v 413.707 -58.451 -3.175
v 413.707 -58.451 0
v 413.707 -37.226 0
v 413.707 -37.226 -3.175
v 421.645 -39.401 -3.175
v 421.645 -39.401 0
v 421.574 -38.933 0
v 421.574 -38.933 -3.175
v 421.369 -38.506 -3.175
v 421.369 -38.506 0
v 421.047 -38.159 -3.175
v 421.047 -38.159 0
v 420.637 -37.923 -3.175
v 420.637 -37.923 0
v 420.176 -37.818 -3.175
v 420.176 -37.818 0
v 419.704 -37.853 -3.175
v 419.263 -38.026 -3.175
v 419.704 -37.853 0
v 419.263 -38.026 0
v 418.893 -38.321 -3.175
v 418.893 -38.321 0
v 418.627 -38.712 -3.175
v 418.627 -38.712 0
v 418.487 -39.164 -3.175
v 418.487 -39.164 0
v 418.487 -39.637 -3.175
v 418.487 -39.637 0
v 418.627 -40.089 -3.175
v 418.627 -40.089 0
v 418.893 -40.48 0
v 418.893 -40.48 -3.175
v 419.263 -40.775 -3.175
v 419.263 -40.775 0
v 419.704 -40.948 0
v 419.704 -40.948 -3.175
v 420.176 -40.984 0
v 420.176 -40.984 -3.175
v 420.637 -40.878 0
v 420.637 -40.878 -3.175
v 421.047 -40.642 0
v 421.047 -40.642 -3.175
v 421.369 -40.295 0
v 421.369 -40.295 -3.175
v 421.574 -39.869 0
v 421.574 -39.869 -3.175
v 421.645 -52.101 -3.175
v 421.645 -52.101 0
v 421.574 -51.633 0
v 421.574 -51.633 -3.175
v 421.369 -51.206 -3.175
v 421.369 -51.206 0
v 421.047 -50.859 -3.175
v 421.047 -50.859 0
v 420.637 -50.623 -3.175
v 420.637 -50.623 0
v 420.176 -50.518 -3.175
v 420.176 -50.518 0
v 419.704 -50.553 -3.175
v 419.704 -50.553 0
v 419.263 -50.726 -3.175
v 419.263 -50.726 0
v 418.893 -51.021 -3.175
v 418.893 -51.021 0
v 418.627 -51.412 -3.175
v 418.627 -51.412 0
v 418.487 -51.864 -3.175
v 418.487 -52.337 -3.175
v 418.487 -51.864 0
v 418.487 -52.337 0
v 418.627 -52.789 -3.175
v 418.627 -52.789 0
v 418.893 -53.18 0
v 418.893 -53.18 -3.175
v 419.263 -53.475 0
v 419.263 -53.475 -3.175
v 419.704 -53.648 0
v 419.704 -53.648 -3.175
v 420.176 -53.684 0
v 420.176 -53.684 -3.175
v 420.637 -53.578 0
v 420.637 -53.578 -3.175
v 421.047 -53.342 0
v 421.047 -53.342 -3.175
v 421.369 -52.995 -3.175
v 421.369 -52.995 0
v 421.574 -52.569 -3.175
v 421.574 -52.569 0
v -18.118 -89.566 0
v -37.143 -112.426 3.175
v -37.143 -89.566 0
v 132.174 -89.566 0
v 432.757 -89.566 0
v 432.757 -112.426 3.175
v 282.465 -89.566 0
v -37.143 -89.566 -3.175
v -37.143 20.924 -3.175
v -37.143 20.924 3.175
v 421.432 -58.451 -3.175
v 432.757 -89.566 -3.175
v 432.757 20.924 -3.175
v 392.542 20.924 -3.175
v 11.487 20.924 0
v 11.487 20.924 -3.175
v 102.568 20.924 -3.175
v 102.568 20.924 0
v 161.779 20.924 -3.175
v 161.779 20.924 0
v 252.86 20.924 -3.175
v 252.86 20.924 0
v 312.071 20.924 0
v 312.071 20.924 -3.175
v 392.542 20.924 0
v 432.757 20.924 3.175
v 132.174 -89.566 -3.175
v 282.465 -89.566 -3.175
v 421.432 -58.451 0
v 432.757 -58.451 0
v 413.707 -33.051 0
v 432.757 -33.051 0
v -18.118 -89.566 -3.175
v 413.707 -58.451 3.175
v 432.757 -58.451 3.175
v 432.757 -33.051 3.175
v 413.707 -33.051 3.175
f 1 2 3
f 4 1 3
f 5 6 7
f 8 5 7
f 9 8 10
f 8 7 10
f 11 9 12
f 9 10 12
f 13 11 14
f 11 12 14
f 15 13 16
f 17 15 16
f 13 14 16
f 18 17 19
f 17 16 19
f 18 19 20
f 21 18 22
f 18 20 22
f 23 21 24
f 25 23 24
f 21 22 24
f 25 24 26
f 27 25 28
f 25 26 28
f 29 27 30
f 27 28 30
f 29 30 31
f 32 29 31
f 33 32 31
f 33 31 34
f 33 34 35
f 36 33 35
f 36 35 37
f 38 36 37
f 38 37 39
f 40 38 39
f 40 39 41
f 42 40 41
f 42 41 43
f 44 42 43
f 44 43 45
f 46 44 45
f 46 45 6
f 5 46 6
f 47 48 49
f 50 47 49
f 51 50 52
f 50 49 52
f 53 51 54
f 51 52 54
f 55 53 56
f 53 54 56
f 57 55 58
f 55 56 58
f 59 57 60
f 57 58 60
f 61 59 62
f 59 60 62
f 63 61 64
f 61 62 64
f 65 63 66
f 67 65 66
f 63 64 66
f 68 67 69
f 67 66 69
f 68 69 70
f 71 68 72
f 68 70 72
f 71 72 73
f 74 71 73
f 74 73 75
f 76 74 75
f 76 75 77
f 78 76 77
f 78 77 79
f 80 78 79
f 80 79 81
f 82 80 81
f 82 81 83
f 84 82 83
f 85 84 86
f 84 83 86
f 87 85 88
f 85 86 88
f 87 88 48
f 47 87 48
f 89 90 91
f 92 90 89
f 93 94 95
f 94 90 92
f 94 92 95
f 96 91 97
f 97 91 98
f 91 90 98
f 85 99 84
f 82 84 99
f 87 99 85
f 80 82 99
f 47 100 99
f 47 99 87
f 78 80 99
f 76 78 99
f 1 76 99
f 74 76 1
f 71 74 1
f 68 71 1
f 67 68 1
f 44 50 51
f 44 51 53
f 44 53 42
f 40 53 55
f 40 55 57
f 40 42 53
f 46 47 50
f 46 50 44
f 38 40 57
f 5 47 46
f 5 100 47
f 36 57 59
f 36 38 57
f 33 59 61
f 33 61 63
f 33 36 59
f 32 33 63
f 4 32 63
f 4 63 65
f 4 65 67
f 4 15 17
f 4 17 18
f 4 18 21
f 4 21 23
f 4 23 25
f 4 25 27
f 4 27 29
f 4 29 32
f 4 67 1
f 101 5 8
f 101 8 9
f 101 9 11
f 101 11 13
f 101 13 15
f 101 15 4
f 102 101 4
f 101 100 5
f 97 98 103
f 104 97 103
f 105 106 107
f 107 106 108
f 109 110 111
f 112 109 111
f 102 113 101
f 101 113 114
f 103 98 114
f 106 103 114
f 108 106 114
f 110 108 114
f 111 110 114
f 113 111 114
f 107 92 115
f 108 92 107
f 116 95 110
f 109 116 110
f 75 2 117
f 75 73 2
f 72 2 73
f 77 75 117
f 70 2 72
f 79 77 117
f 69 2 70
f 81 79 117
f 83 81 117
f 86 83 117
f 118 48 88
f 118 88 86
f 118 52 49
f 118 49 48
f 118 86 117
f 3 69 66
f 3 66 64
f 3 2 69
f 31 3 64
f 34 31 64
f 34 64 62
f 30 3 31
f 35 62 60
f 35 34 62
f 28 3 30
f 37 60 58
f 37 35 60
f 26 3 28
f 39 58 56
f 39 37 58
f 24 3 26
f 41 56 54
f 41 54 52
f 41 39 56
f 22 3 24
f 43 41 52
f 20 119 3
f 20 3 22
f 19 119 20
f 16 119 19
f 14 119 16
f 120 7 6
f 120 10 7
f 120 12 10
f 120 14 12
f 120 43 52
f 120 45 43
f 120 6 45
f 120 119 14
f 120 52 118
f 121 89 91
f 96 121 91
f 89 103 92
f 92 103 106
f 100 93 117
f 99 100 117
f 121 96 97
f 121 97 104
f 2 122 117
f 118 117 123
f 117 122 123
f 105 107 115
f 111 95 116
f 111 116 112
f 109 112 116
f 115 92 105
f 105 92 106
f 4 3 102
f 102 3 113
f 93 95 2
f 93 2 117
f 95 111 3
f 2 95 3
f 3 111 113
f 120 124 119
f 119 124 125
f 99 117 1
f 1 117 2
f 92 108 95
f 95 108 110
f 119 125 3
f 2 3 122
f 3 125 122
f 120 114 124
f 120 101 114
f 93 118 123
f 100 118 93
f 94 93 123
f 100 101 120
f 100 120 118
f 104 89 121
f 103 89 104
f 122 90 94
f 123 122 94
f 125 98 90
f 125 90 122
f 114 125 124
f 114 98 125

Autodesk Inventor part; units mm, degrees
ref_plane "YZ Plane" through (0, 0, 0) normal (1, 0, 0) x (0, 1, 0)
ref_plane "XZ Plane" through (0, 0, 0) normal (0, 1, 0) x (-1, 0, 0)
ref_plane "XY Plane" through (0, 0, 0) normal (0, 0, 1) x (1, 0, 0)
sketch "Sketch1" plane through (0, 0, 0) normal (0, 0, 1) x (1, 0, 0)
  line L0 (-37.1429, 20.9244) -> (432.7571, 20.9244)
  line L1 (432.7571, 20.9244) -> (432.7571, -112.4256)
  line L2 (432.7571, -112.4256) -> (-37.1429, -112.4256)
  line L3 (-37.1429, -112.4256) -> (-37.1429, 20.9244)
  point P0 (0, 0)
  dimension "d0" = 469.9
  dimension "d1" = 133.35
extrude "Extrusion1" add sketch "Sketch1" along normal blind 3.175
sketch "Sketch2" plane through (432.7571, -112.4256, 0) normal (1, 0, 0) x (0, 0, -1)
  line L0 (0, 133.35) -> (0, 0) projected
  line L1 (-3.175, 133.35) -> (0, 107.95)
  line L2 (-3.175, 0) -> (0, 22.86)
  line L3 (-3.175, 0) -> (0, 0)
  line L4 (0, 22.86) -> (0, 0)
  point P0 (0, 112.4256)
  dimension "d4" = 25.4
  dimension "d5" = 22.86
extrude "Extrusion3" cut sketch "Sketch2" against normal blind 476.25
sketch "Sketch4" plane through (0, 0, 0) normal (0, 0, -1) x (-1, 0, 0)
  line L0 (-432.7571, -89.5656) -> (37.1429, -89.5656) projected
  line L1 (37.1429, 20.9244) -> (-432.7571, 20.9244) projected
  line L2 (-432.7571, 20.9244) -> (-432.7571, -89.5656) projected
  line L3 (-432.7571, -89.5656) -> (37.1429, -89.5656)
  line L4 (37.1429, -89.5656) -> (37.1429, 20.9244)
  line L5 (37.1429, 20.9244) -> (-432.7571, 20.9244)
  line L6 (-432.7571, 20.9244) -> (-432.7571, -89.5656)
  line L7 (-282.4653, -89.5656) -> (-282.4653, 20.9244)
  line L8 (-132.1735, -89.5656) -> (-132.1735, 20.9244)
  line L9 (18.1183, -89.5656) -> (18.1183, 20.9244)
  line L10 (-282.4653, -89.5656) -> (-312.071, 20.9244)
  line L11 (-432.7571, -89.5656) -> (-392.5421, 20.9244)
  line L12 (-282.4653, -89.5656) -> (-252.8596, 20.9244)
  line L13 (-132.1735, -89.5656) -> (-161.7792, 20.9244)
  line L14 (-132.1735, -89.5656) -> (-102.5678, 20.9244)
  line L15 (18.1183, -89.5656) -> (-11.4874, 20.9244)
  line L16 (18.1183, 20.9244) -> (37.1429, 20.9244)
  line L17 (37.1429, 20.9244) -> (37.1429, -89.5656)
  line L18 (37.1429, -89.5656) -> (18.1183, -89.5656)
  line L19 (18.1183, -89.5656) -> (18.1183, 20.9244)
  point P0 (0, 0)
  dimension "d10" = 150.2918
  dimension "d11" = 150.2918
  dimension "d12" = 150.2918
  dimension "d13" = 20
  dimension "d14" = 15
  dimension "d15" = 15
extrude "Extrusion4" add sketch "Sketch4" along normal blind 3.175 contours L2 L1 L11 | L10 L1 L7 | L7 L1 L12 | L13 L1 L8 | L8 L1 L14 | L15 L1 L9
sketch "Sketch5" plane through (0, 0, 0) normal (0, 0, -1) x (-1, 0, 0)
  line L0 (18.1183, 20.9244) -> (18.1183, -89.5656) projected
  line L1 (18.1183, -89.5656) -> (37.1429, -89.5656) projected
  line L2 (37.1429, -89.5656) -> (37.1429, 20.9244) projected
  line L3 (37.1429, 20.9244) -> (18.1183, 20.9244) projected
  line L4 (18.1183, 20.9244) -> (37.1429, 20.9244)
  line L5 (37.1429, 20.9244) -> (37.1429, -89.5656)
  line L6 (37.1429, -89.5656) -> (18.1183, -89.5656)
  line L7 (18.1183, -89.5656) -> (18.1183, 20.9244)
  point P0 (0, 0)
sketch "Sketch6" plane through (0, 0, 3.175) normal (0, 0, 1) x (1, 0, 0)
  line L0 (-37.1429, 20.9244) -> (-18.1183, 20.9244)
  line L1 (-18.1183, 20.9244) -> (-18.1183, -89.5656)
  line L2 (-18.1183, -89.5656) -> (-37.1429, -89.5656)
  line L3 (-37.1429, -89.5656) -> (-37.1429, 20.9244)
  point P0 (0, 0)
  dimension "d18" = 110.49
  dimension "d19" = 19.0246
extrude "Extrusion5" add sketch "Sketch6" against normal blind 6.35
sketch "Sketch9" plane through (0, 0, 3.175) normal (0, 0, 1) x (1, 0, 0)
  line L0 (432.7571, 20.9244) -> (432.7571, -112.4256) projected
  line L1 (432.7571, -33.0506) -> (413.7071, -33.0506)
  line L2 (413.7071, -33.0506) -> (413.7071, -58.4506)
  line L3 (413.7071, -58.4506) -> (432.7571, -58.4506)
  line L4 (432.7571, -58.4506) -> (432.7571, -33.0506)
  point P0 (0, 0)
  dimension "d38" = 25.4
  dimension "d39" = 19.05
  dimension "d40" = 53.975
extrude "Extrusion8" cut sketch "Sketch9" against normal blind 3.175
sketch "Sketch10" plane through (0, 0, 0) normal (0, 0, 1) x (1, 0, 0)
  line L0 (413.7071, -37.2262) -> (421.4322, -58.4506) projected
  line L1 (432.7571, -33.0506) -> (413.7071, -33.0506) projected
  line L2 (413.7071, -33.0506) -> (413.7071, -37.2262) projected
  line L3 (413.7071, -37.2262) -> (421.4322, -58.4506)
  line L4 (413.7071, -58.4506) -> (413.7071, -37.2262)
  line L5 (421.4322, -58.4506) -> (413.7071, -58.4506)
  circle A0 centre (420.0571, -39.4006) radius 1.5875
  circle A1 centre (420.0571, -52.1006) radius 1.5875
  point P0 (0, 0)
  dimension "d43" = 12.7
  dimension "d44" = 6.35
  dimension "d45" = 3.175
  dimension "d46" = 3.175
  dimension "d47" = 6.35
extrude "Extrusion9" add sketch "Sketch10" against normal blind 3.175 contours L0 A1 L5 L4 | L0 A1 picked at (419.0163, -52.1007)
extrude "Extrusion10" cut sketch "Sketch10" against normal blind 3.175 contours A1 L0 | L0 A1 | A0
properties part number "bottom panel left"
